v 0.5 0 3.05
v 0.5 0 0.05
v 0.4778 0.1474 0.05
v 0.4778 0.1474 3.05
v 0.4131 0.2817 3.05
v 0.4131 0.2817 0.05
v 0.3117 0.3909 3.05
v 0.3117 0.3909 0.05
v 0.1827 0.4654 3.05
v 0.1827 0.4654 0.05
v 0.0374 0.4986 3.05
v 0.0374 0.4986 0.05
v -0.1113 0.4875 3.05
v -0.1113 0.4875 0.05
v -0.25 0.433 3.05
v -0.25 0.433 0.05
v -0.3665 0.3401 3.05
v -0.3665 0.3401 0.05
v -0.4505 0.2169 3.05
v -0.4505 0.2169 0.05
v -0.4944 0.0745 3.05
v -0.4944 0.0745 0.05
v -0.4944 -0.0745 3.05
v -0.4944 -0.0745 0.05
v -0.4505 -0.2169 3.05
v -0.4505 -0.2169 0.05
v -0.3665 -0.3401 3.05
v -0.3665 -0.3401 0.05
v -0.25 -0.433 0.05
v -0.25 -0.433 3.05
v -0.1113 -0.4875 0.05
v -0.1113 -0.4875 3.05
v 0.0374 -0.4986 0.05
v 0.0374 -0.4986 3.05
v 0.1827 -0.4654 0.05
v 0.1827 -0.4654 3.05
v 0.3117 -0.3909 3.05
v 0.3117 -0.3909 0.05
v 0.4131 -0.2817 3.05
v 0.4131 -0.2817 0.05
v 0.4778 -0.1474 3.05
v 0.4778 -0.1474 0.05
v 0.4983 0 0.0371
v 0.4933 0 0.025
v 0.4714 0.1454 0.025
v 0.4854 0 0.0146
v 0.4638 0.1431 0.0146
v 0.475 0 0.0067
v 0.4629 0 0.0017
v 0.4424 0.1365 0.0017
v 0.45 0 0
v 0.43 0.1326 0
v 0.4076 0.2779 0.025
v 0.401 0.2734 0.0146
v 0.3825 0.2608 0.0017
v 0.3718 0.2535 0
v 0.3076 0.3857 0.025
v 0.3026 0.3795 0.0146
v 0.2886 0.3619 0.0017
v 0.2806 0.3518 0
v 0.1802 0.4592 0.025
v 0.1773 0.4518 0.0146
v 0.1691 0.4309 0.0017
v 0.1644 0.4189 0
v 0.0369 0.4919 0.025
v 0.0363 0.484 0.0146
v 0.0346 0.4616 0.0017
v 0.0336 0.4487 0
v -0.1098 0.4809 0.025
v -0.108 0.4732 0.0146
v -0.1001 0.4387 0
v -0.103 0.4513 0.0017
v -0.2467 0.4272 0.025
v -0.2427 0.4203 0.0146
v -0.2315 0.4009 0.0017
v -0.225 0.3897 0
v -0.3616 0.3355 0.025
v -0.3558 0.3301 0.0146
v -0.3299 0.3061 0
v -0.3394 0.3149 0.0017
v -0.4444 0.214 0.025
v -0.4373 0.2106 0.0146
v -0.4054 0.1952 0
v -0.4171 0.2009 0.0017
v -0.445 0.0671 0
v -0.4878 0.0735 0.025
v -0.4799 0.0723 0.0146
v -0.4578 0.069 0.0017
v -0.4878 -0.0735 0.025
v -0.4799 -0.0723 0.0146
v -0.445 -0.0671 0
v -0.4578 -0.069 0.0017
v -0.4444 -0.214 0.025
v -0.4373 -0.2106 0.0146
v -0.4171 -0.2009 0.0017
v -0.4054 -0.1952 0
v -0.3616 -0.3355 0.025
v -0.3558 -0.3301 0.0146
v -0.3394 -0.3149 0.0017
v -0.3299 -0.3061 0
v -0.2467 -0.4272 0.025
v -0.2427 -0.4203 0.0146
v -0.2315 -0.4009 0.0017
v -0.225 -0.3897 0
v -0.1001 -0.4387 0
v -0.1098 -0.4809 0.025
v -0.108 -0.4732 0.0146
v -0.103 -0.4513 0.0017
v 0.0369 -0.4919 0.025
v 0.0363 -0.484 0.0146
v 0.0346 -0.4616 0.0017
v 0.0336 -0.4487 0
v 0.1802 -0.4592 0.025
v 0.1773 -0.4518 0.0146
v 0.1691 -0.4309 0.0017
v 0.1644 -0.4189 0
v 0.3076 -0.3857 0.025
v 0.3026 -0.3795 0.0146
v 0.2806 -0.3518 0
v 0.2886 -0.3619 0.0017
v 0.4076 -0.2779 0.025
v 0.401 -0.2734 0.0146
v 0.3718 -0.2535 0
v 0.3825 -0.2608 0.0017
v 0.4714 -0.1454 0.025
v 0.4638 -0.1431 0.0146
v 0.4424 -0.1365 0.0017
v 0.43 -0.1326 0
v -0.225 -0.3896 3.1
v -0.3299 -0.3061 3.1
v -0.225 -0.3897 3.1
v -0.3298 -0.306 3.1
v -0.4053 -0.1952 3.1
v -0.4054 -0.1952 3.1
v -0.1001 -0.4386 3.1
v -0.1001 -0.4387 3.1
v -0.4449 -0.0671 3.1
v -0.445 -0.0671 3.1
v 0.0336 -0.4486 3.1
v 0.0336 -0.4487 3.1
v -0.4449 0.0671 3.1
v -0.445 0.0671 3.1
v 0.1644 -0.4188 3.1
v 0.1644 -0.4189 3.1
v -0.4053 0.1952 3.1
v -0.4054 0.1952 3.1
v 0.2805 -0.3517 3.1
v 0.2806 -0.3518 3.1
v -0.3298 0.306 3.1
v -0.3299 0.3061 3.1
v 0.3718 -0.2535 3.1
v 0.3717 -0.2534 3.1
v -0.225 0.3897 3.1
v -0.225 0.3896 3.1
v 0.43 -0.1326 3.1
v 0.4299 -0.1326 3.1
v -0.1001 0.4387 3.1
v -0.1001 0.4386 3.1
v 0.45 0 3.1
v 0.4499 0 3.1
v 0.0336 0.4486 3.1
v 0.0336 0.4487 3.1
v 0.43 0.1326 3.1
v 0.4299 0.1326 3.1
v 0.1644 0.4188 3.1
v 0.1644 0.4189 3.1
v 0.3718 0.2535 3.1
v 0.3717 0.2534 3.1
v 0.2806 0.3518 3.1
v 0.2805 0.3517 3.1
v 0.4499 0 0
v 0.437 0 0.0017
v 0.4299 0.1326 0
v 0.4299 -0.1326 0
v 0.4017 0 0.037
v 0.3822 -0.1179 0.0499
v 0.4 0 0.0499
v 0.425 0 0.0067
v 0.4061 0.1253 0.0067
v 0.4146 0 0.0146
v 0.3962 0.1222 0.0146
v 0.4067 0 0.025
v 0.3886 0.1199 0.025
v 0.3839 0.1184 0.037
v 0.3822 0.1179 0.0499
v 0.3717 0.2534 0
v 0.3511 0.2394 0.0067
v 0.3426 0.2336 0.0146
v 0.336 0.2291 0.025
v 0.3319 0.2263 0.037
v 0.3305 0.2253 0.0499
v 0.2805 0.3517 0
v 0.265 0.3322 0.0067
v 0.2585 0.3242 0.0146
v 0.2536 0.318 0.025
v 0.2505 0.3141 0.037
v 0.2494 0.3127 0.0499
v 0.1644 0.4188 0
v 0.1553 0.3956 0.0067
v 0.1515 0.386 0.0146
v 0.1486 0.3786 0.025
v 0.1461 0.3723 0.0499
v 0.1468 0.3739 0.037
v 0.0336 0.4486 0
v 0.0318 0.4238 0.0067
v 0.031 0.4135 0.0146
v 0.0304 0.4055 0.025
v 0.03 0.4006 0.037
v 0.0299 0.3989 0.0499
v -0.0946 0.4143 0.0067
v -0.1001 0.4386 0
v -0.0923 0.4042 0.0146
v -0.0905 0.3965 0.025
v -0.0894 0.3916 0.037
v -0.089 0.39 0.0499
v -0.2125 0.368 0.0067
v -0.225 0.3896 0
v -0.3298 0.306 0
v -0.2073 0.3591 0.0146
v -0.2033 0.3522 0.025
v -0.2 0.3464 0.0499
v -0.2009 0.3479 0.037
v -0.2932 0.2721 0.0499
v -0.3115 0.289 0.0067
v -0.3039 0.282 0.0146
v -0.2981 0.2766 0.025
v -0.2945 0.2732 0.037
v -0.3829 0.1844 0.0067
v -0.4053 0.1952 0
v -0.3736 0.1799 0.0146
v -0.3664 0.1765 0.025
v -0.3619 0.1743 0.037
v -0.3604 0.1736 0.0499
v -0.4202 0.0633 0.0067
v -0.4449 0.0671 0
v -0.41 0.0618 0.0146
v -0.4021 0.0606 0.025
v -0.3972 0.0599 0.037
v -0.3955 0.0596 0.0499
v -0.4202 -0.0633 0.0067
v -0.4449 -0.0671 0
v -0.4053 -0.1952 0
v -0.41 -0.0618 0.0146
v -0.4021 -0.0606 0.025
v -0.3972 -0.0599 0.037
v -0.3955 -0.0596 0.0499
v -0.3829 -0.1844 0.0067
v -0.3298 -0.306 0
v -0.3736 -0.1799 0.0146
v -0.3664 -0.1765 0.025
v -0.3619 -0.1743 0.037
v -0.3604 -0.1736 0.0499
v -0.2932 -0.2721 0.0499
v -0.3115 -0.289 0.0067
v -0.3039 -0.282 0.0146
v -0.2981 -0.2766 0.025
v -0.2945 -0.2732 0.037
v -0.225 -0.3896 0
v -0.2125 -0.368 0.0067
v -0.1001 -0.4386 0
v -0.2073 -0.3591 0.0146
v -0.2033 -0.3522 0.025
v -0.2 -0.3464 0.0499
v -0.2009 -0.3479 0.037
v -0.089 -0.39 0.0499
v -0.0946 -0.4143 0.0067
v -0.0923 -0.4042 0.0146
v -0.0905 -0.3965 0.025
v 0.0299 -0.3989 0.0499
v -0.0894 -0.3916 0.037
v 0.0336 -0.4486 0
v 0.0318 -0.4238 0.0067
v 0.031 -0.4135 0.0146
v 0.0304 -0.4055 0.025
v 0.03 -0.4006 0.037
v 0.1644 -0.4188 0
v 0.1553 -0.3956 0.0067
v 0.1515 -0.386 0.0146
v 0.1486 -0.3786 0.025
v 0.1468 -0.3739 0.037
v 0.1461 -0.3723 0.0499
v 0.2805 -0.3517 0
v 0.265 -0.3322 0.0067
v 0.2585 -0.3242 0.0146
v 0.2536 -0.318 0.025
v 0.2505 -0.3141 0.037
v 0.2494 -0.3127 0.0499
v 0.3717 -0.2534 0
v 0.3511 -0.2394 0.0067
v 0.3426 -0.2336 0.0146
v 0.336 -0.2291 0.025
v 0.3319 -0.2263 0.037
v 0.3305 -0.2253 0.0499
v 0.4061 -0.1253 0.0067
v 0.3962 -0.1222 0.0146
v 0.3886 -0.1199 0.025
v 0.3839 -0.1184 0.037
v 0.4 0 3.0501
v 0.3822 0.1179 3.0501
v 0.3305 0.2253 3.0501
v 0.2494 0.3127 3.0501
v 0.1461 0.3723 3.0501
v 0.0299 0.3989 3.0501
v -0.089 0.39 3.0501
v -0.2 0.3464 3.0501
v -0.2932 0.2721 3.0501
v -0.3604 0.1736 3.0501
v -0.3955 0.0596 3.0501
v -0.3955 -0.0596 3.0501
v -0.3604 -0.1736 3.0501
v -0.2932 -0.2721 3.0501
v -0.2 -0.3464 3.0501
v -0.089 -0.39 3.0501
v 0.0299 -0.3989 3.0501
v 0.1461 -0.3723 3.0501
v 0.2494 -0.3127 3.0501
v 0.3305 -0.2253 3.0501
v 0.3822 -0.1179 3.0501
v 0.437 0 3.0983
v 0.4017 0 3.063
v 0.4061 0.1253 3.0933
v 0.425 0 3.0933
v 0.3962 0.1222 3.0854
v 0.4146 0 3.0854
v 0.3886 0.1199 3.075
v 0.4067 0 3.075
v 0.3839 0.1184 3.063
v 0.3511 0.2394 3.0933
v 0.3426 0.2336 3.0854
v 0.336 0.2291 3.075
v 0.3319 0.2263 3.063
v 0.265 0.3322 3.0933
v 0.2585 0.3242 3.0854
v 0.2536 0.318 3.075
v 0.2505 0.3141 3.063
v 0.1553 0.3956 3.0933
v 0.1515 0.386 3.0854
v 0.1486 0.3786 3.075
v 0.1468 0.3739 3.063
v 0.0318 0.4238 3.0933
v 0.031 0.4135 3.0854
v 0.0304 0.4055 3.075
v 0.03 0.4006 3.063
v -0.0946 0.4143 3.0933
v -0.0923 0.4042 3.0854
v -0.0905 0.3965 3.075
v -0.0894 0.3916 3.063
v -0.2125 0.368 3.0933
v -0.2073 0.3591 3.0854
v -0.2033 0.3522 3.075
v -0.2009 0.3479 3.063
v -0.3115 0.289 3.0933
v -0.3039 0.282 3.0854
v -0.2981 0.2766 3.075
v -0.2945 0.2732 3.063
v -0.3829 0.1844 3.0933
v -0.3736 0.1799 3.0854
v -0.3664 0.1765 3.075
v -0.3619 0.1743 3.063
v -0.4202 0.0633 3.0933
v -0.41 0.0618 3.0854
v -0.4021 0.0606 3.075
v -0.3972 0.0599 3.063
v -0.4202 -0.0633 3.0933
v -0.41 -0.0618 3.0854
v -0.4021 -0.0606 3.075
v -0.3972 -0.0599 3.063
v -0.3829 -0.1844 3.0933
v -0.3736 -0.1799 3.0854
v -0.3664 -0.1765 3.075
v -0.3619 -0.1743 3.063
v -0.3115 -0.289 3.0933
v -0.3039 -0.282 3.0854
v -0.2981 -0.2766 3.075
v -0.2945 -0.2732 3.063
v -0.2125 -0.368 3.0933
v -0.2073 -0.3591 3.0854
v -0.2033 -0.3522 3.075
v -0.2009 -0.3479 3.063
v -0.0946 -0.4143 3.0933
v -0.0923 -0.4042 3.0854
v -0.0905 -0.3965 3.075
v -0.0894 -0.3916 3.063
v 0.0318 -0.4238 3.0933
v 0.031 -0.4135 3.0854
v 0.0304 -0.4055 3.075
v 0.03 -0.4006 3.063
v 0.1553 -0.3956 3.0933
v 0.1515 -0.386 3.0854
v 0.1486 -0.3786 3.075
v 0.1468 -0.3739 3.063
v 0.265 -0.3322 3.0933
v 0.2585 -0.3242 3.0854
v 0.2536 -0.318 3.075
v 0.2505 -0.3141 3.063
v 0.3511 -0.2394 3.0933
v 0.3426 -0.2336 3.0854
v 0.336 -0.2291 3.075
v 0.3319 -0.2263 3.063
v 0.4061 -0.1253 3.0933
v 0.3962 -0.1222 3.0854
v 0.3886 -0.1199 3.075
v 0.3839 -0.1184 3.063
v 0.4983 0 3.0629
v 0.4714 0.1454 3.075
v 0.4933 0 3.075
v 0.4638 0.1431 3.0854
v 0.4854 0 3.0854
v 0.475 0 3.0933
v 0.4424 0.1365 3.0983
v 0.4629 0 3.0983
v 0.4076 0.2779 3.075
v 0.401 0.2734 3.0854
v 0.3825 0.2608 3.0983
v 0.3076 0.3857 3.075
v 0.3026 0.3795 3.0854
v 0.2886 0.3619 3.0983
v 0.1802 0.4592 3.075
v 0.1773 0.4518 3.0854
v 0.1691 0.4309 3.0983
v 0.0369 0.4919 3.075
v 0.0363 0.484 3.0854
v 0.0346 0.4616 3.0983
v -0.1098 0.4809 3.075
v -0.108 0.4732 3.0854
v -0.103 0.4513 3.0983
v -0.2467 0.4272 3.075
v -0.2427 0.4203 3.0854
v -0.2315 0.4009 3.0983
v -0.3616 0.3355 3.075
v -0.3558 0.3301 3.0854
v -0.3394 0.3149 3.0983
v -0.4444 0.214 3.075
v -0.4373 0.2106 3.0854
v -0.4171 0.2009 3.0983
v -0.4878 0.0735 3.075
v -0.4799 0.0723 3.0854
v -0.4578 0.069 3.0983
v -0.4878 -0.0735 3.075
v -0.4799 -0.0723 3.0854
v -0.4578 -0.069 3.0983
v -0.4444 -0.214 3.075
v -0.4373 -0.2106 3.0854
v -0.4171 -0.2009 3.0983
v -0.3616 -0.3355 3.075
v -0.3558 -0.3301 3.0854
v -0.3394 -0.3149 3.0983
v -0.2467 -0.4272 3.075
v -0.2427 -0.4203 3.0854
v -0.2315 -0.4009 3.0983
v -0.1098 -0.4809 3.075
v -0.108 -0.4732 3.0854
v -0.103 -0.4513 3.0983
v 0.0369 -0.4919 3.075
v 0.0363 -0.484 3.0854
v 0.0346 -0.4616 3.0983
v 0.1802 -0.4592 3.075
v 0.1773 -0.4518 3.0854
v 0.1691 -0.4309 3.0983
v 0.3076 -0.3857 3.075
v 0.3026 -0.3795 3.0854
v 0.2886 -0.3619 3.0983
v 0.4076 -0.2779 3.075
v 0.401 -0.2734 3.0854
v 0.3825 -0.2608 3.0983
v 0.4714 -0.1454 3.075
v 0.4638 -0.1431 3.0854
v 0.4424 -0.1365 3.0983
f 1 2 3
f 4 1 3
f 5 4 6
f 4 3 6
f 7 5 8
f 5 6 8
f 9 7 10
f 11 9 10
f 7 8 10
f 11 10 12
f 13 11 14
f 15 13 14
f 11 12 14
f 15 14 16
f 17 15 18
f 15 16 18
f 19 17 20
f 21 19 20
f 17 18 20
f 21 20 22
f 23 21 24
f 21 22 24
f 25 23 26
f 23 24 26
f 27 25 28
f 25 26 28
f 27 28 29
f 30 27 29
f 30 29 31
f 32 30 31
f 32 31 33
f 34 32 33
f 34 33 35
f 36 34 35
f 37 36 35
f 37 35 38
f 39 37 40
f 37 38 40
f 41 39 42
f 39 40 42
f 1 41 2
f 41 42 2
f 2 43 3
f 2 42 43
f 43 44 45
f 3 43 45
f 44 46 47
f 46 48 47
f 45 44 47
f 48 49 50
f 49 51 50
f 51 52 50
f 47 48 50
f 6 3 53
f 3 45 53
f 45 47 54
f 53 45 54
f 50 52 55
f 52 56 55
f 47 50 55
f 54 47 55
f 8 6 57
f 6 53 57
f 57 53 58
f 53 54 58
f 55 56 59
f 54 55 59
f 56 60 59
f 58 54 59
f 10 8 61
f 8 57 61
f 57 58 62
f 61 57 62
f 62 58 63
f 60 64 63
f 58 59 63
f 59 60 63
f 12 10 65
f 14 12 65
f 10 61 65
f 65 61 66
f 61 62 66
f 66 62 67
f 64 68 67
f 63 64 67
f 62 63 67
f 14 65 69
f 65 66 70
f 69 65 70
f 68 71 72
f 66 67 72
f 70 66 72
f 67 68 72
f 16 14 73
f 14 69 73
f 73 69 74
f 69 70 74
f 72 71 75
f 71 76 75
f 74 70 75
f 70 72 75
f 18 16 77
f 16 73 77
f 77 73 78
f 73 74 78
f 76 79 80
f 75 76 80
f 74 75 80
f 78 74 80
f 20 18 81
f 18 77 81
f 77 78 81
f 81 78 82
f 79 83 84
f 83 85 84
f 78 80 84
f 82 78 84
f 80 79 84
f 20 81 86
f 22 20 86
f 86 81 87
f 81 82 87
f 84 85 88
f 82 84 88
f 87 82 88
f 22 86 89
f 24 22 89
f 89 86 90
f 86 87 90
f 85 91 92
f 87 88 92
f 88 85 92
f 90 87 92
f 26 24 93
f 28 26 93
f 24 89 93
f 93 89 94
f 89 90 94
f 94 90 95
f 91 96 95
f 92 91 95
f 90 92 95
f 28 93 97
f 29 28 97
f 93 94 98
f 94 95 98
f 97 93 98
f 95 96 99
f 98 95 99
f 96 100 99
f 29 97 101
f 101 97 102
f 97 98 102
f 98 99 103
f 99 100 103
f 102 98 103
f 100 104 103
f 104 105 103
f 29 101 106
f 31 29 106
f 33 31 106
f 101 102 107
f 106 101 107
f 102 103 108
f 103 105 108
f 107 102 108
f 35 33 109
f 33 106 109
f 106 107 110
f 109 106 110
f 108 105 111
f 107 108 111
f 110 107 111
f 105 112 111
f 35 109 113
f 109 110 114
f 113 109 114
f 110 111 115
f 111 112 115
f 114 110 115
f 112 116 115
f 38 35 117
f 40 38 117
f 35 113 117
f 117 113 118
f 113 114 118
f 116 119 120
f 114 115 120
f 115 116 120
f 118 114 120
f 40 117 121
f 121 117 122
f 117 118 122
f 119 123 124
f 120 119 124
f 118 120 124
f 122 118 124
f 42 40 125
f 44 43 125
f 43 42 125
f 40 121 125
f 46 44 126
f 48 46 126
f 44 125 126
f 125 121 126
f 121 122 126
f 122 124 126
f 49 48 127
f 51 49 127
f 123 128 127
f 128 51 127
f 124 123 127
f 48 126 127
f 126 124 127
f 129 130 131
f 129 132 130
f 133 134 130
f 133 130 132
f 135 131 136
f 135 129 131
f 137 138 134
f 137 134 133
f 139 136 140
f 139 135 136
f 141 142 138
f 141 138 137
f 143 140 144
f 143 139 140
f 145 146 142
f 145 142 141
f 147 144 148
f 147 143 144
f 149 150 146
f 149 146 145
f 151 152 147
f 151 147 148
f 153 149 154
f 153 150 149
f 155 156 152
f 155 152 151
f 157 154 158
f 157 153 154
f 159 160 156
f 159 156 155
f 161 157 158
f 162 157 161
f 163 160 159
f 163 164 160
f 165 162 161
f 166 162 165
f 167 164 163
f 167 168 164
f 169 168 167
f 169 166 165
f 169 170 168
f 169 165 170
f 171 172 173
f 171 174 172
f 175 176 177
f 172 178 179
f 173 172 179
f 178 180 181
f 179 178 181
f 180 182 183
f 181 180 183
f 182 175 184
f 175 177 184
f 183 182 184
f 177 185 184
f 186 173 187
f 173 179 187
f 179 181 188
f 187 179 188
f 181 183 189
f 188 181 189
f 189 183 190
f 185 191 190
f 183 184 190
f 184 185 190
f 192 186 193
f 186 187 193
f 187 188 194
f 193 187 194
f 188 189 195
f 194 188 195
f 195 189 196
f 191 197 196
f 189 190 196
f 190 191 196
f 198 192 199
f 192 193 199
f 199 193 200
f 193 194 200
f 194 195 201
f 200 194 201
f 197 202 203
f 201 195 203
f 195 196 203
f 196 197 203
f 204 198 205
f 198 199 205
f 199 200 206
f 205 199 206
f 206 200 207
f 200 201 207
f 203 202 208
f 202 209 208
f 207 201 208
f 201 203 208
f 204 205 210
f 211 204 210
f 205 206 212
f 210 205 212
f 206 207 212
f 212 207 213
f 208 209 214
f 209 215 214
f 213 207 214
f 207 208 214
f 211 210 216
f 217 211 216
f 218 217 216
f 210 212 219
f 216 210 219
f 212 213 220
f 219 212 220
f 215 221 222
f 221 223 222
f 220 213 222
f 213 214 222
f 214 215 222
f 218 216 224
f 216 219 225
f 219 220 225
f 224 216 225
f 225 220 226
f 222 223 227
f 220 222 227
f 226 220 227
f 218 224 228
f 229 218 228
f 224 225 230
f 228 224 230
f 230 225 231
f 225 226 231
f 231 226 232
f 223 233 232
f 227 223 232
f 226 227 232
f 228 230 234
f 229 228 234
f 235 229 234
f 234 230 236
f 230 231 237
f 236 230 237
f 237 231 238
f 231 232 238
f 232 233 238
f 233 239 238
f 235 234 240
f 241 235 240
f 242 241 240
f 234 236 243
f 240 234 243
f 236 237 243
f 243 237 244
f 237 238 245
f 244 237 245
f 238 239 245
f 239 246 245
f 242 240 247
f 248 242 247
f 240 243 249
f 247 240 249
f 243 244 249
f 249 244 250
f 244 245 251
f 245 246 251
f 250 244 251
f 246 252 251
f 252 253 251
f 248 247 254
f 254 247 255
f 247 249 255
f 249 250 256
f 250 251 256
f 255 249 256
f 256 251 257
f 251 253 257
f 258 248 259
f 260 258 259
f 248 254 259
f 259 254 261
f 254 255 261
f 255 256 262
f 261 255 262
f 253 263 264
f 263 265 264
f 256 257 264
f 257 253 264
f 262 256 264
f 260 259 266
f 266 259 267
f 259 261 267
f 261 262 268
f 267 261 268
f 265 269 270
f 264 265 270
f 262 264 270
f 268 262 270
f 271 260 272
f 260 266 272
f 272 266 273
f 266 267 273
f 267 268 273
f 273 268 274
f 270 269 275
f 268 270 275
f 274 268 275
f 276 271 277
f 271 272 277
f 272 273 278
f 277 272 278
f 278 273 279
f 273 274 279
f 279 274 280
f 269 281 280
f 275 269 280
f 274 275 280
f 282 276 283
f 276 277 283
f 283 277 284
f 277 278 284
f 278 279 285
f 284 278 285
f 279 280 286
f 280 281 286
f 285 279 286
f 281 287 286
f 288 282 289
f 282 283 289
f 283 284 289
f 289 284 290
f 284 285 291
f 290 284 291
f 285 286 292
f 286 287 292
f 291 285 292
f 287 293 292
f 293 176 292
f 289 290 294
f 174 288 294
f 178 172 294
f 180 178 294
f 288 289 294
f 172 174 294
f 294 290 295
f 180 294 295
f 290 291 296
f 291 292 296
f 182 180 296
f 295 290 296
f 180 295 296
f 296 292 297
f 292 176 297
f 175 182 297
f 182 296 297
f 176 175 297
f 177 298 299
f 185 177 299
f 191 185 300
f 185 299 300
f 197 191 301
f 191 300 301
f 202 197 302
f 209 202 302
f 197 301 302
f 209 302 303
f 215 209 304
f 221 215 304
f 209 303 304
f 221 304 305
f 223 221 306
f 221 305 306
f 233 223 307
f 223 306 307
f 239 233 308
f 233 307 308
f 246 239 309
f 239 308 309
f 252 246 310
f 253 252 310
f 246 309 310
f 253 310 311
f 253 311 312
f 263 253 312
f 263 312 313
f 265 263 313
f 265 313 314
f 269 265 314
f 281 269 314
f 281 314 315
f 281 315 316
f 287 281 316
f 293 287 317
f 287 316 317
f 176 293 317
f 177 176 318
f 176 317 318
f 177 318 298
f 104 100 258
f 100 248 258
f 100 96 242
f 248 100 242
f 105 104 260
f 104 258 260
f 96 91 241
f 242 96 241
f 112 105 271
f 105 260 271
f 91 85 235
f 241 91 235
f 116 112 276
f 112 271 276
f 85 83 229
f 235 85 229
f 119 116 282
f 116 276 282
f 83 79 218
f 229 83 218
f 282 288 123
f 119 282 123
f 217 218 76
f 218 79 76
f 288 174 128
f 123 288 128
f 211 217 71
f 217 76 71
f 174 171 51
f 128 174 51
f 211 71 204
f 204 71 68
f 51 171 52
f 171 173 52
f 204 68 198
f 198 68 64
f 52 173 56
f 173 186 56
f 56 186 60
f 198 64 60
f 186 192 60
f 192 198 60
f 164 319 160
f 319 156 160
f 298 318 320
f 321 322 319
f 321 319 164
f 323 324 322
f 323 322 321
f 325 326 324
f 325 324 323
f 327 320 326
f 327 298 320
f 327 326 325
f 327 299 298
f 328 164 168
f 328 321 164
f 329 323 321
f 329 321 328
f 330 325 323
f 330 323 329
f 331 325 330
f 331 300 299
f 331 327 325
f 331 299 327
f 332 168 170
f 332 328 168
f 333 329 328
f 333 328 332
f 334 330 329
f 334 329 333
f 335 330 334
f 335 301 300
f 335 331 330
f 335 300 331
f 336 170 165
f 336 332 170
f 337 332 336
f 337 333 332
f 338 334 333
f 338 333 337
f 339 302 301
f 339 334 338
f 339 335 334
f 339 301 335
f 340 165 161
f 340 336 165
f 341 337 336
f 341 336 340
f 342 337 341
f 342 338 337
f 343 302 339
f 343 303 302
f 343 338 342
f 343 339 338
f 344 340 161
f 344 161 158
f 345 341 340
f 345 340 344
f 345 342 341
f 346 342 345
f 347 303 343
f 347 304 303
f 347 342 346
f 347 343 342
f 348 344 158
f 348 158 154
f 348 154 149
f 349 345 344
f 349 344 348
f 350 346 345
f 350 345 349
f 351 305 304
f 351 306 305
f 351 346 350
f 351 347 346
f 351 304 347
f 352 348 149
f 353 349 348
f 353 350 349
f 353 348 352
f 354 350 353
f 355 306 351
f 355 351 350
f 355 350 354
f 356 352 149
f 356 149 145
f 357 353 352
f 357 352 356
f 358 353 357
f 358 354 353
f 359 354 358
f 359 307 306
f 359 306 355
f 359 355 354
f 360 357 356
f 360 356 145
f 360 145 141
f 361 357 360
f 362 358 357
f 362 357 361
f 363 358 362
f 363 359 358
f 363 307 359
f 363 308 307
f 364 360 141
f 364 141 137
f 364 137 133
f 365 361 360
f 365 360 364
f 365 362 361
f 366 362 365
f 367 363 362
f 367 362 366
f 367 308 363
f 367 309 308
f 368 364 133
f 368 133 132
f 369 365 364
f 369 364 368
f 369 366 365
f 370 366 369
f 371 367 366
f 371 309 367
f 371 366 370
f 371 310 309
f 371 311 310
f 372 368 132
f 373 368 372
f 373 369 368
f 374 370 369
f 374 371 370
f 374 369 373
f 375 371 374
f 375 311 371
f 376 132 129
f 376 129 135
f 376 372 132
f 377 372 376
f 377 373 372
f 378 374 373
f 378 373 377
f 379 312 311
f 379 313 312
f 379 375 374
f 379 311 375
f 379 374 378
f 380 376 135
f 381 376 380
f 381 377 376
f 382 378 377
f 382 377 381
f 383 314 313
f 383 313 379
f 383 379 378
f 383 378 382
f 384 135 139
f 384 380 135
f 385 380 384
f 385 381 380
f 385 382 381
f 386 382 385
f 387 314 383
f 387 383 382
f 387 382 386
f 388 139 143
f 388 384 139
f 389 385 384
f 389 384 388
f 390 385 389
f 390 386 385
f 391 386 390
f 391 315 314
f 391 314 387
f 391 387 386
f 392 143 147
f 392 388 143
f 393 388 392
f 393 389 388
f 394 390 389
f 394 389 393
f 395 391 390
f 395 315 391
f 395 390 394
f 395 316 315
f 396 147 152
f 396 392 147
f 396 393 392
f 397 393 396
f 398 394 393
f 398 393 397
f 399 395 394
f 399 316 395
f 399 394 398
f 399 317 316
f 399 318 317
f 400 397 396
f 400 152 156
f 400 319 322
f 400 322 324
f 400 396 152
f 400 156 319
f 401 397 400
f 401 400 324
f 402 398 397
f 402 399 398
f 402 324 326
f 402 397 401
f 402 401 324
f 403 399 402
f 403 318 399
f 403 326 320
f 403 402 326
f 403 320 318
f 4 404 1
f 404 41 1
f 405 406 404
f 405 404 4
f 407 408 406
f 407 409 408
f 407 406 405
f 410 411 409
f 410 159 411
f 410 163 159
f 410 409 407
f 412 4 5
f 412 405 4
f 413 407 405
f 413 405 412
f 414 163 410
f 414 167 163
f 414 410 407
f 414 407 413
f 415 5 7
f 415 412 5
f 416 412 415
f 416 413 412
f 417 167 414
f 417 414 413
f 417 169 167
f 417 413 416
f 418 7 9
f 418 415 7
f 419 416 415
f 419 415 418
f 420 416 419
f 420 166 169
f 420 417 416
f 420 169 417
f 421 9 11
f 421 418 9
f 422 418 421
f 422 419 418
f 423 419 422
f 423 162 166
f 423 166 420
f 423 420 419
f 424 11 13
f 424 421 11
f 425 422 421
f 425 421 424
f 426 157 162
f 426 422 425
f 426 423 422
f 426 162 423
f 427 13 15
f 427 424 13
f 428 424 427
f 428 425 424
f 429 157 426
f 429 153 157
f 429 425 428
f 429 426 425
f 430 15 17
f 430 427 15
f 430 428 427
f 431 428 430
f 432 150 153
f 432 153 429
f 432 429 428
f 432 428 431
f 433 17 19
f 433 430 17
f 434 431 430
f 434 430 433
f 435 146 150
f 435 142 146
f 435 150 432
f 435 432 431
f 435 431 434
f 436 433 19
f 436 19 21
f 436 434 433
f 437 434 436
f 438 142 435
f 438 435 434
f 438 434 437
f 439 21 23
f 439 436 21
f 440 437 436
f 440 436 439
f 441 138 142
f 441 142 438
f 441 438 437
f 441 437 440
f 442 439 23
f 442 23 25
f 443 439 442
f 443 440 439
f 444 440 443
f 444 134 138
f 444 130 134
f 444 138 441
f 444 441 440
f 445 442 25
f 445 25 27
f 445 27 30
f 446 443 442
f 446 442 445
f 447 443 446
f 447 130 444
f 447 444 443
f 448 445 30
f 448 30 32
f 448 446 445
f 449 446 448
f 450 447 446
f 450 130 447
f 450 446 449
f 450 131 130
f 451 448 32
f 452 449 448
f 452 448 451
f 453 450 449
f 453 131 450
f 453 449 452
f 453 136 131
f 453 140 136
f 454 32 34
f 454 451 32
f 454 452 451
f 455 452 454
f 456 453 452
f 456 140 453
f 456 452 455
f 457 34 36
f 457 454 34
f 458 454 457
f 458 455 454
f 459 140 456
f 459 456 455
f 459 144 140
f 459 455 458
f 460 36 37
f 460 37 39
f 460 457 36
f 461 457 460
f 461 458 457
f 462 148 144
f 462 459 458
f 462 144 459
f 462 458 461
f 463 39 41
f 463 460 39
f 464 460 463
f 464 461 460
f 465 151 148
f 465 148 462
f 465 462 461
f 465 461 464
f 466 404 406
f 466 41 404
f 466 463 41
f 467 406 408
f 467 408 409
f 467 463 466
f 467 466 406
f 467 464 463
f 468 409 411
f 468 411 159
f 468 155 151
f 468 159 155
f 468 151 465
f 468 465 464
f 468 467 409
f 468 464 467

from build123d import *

# Parameters (mm, degrees)
SKETCH1_R           = 0.5
BOSS_EXTRUDE1_DEPTH = 3.1
SKETCH2_R           = 0.4
CUT_EXTRUDE1_DEPTH  = 3.1
FILLET1_R           = 0.05
FILLET2_R           = 0.05
FILLET3_R           = 0.05
FILLET4_R           = 0.05


with BuildPart() as part:
    # Sketch1 → Boss-Extrude1 (new body)
    with BuildSketch(Plane.XY):
        Circle(SKETCH1_R)
    extrude(amount=BOSS_EXTRUDE1_DEPTH)

    # Sketch2 → Cut-Extrude1 (cut)
    with BuildSketch(Plane.XY.offset(3.1)):
        Circle(SKETCH2_R)
    extrude(amount=-CUT_EXTRUDE1_DEPTH, mode=Mode.SUBTRACT)

    # Fillet1
    fillet1_edges = [part.edges().sort_by_distance(p)[0] for p in [
        (-0.5, 0, 3.1),
    ]]
    fillet(fillet1_edges, radius=FILLET1_R)

    # Fillet2
    fillet2_edges = [part.edges().sort_by_distance(p)[0] for p in [
        (-0.4, 0, 3.1),
    ]]
    fillet(fillet2_edges, radius=FILLET2_R - 0.0001)  # a hair under: the kernel refuses the full size

    # Fillet3
    fillet3_edges = [part.edges().sort_by_distance(p)[0] for p in [
        (-0.5, 0, 0),
    ]]
    fillet(fillet3_edges, radius=FILLET3_R)

    # Fillet4
    fillet4_edges = [part.edges().sort_by_distance(p)[0] for p in [
        (-0.4, 0, 0),
    ]]
    fillet(fillet4_edges, radius=FILLET4_R - 0.0001)  # a hair under: the kernel refuses the full size


solid = part.part
